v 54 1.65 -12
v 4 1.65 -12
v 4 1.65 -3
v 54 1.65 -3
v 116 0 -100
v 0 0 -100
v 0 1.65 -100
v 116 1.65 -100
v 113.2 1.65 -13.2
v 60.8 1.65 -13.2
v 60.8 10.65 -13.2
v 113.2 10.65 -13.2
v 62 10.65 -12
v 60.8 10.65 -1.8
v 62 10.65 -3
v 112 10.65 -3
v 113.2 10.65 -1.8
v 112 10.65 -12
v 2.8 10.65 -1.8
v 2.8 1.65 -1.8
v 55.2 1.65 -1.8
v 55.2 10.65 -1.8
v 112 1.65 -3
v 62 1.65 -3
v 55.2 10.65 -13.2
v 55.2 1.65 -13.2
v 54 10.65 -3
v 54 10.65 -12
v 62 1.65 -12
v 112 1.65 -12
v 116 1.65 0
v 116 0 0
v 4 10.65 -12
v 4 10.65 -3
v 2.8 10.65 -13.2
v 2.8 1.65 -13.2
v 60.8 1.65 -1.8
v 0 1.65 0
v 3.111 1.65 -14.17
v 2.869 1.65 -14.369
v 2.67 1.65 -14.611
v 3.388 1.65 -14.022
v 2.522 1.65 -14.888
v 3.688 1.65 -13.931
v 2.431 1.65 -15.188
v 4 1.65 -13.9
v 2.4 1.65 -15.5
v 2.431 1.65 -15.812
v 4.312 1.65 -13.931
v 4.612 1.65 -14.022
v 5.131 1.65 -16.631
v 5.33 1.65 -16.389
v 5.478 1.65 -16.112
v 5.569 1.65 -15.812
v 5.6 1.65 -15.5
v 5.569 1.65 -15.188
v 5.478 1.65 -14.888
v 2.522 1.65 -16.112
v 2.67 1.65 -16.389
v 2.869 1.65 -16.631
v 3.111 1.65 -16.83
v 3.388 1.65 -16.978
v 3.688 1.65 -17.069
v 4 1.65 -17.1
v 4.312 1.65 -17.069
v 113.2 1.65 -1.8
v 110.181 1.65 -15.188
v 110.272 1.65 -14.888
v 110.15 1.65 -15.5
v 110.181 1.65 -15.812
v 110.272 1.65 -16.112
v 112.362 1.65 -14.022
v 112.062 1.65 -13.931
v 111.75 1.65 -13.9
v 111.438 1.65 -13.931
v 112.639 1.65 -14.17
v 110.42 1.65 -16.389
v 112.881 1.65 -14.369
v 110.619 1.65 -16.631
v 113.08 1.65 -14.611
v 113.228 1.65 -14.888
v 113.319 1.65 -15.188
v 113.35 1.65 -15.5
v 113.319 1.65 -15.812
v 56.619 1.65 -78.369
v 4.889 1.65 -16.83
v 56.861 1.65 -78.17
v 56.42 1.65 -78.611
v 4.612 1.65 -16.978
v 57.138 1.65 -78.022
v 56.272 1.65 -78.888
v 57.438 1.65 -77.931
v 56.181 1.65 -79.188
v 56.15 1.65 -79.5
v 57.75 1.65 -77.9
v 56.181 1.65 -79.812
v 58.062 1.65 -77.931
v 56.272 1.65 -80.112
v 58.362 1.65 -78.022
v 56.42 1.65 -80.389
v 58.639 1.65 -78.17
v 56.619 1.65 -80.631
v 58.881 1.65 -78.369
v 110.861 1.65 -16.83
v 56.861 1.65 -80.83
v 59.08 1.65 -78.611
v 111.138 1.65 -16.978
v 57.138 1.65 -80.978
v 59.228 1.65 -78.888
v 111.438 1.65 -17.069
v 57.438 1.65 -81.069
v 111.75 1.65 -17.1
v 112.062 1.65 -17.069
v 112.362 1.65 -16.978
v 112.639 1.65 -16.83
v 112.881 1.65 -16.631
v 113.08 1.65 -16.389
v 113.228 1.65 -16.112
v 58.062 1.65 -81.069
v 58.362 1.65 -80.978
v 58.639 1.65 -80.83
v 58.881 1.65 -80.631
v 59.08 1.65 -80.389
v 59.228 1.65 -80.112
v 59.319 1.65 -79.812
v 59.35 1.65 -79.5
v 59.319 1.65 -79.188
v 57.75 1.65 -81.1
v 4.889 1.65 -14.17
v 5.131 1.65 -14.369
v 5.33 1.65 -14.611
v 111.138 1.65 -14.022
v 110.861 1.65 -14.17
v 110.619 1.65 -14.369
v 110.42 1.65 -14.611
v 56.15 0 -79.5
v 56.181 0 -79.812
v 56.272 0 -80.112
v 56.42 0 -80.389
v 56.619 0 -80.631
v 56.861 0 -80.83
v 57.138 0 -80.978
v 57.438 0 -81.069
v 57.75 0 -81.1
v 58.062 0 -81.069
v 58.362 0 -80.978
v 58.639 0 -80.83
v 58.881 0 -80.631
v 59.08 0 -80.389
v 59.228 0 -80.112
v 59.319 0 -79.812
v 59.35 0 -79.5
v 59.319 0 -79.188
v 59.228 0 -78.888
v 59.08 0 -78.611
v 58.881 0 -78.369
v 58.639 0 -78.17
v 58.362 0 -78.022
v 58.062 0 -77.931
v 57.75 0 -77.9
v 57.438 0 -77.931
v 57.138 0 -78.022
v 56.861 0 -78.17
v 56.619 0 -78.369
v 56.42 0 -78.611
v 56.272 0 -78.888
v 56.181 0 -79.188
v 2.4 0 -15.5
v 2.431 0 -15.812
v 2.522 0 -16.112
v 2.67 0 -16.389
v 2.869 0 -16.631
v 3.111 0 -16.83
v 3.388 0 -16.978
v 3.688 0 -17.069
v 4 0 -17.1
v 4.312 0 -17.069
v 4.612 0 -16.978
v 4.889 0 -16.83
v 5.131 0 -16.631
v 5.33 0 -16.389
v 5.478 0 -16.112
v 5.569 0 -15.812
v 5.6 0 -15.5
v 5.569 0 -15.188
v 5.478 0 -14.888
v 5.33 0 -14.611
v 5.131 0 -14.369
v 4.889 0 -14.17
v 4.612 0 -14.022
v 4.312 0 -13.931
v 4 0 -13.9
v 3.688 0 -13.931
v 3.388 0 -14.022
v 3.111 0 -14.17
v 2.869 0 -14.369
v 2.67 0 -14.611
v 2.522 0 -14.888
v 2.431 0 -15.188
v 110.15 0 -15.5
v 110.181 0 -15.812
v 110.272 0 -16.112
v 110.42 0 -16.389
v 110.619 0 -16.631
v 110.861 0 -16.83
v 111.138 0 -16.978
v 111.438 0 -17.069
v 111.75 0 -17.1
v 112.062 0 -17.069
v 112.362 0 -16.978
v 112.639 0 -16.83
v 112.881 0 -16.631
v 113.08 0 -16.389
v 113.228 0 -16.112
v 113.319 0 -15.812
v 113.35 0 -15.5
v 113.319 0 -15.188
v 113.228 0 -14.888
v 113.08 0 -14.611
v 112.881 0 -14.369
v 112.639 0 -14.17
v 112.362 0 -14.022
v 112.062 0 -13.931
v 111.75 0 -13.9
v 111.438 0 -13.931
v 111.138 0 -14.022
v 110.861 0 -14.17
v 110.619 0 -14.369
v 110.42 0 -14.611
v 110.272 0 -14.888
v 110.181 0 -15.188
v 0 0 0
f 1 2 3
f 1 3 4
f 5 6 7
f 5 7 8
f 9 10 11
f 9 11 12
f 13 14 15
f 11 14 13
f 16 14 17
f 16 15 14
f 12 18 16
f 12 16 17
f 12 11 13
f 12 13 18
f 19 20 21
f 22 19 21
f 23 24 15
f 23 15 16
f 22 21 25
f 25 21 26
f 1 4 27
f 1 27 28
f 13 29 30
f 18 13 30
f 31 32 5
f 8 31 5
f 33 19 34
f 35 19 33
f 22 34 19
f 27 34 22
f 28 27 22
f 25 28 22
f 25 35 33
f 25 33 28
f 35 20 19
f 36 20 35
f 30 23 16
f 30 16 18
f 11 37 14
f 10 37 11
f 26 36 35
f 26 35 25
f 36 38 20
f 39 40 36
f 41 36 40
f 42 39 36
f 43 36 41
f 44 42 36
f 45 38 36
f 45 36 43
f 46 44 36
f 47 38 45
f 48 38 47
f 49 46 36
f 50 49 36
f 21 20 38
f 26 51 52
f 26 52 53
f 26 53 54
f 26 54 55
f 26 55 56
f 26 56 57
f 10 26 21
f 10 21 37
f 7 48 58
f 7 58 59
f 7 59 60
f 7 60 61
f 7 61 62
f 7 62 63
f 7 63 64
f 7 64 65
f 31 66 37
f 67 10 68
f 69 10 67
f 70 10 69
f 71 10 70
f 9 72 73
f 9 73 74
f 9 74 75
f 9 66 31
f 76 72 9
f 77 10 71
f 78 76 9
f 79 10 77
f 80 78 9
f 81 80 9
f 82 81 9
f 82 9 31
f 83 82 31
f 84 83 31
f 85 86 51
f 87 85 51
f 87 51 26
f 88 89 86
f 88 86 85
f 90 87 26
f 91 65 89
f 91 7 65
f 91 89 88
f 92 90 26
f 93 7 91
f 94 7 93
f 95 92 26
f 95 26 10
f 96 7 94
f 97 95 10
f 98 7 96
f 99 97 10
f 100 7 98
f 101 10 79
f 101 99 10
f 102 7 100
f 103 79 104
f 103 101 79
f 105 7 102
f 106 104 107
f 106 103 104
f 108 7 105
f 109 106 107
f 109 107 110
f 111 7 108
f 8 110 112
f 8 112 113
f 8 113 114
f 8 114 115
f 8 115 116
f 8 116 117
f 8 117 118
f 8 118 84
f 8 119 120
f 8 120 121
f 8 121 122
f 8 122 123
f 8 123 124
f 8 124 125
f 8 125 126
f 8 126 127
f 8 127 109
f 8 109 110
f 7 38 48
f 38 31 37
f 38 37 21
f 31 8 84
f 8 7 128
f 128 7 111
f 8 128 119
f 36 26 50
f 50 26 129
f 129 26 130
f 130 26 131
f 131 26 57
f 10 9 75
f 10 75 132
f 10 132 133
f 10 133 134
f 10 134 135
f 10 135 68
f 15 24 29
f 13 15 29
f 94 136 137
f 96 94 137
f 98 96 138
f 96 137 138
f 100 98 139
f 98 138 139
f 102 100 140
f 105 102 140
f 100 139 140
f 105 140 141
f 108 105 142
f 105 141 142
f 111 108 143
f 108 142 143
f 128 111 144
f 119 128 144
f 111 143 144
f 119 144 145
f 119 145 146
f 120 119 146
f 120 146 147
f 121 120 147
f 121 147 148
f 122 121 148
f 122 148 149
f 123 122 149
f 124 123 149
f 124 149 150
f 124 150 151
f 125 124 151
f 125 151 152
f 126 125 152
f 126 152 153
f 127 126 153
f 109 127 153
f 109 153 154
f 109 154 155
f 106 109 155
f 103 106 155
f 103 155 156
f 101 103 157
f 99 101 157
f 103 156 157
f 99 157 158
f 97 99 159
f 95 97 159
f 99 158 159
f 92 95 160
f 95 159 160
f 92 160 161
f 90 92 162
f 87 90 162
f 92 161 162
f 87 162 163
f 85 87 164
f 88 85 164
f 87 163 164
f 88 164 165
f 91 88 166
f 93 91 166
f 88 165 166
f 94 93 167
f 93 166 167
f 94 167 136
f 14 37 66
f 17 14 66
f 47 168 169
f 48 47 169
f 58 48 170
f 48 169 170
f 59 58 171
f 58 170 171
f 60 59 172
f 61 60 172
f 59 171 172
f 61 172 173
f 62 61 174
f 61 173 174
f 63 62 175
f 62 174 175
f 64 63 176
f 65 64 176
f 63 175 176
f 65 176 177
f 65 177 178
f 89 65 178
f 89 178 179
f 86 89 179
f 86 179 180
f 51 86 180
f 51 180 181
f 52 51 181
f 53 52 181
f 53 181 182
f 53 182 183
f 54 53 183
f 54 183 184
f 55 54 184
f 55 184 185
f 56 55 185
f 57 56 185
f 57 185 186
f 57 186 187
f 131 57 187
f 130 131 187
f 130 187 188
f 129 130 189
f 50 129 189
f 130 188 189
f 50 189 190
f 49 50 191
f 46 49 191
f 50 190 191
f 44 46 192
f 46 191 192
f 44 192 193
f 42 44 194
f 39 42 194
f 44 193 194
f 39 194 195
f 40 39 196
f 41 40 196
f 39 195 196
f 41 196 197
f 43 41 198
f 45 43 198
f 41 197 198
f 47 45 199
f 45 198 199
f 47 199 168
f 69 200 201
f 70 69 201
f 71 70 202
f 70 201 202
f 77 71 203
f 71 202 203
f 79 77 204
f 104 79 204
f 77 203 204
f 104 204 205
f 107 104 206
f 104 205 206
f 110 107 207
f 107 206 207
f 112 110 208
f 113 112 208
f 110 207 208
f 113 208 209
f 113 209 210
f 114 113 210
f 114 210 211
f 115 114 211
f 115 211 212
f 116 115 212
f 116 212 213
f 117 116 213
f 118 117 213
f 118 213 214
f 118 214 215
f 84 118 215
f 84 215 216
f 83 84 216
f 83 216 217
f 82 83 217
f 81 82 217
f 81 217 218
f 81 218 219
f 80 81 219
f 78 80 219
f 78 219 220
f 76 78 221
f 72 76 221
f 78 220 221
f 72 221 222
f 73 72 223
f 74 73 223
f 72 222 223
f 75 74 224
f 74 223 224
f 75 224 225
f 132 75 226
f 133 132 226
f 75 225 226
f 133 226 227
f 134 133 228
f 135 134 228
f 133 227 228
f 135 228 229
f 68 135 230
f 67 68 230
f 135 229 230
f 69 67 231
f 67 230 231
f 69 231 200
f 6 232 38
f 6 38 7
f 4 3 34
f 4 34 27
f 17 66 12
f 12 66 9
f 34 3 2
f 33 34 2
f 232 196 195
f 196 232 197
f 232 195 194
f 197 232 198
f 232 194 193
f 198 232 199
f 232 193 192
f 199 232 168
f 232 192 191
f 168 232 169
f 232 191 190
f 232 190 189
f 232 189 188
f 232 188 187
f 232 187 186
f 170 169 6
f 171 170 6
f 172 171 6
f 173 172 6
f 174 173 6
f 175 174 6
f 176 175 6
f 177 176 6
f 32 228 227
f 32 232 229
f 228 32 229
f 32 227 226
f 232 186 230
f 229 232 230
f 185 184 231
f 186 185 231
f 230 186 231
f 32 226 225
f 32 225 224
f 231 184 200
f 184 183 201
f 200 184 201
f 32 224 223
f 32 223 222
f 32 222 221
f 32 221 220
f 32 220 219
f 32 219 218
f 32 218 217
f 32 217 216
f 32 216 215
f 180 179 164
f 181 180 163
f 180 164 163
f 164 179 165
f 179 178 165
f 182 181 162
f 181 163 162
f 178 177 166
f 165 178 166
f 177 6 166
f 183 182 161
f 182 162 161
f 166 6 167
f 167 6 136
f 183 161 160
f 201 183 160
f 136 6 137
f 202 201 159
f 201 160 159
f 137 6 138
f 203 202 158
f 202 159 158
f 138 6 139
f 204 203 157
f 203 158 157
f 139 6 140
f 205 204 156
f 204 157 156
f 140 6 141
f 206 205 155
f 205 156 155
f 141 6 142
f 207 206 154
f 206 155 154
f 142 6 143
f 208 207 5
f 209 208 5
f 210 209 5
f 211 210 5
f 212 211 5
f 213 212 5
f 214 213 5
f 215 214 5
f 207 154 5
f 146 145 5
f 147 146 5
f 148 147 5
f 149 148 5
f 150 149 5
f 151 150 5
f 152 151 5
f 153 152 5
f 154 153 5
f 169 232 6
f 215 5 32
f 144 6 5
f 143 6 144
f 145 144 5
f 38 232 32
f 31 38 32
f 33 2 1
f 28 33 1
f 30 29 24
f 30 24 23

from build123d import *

# Parameters (mm, degrees)
SKETCH1_W                = 116
SKETCH1_H                = 100
BOSS_EXTRUDE1_DEPTH      = 1.65
M3_CLEARANCE_HOLE1_D     = 3.2
M3_CLEARANCE_HOLE1_DEPTH = 20
M3_CLEARANCE_HOLE1_TIP   = 0.96137699
SKETCH6_W                = 52.4
SKETCH6_H                = 11.4
SKETCH6_W_2              = 50
SKETCH6_H_2              = 9
EXTRUDE_THIN1_DEPTH      = 9


with BuildPart() as part:
    # Sketch1 → Boss-Extrude1 (new body)
    with BuildSketch(Plane(origin=(0, 0, 0), x_dir=(1, 0, 0), z_dir=(0, 1, 0))):
        with Locations((58, 50)):
            Rectangle(SKETCH1_W, SKETCH1_H)
    extrude(amount=BOSS_EXTRUDE1_DEPTH)

    # M3 Clearance Hole1
    with Locations(Plane(origin=(0, 1.65, 0), x_dir=(1, 0, 0), z_dir=(0, 1, 0))):
        with Locations((4, 15.5), (111.75, 15.5), (57.75, 79.5)):
            Hole(M3_CLEARANCE_HOLE1_D / 2, depth=M3_CLEARANCE_HOLE1_DEPTH)
            with Locations((0, 0, -(M3_CLEARANCE_HOLE1_DEPTH + M3_CLEARANCE_HOLE1_TIP / 2))):  # 118° drill point
                Cone(0, M3_CLEARANCE_HOLE1_D / 2, M3_CLEARANCE_HOLE1_TIP, mode=Mode.SUBTRACT)

    # Sketch6 → Extrude-Thin1 (add)
    with BuildSketch(Plane(origin=(0, 1.65, 0), x_dir=(1, 0, 0), z_dir=(0, 1, 0))):
        with Locations((29, 7.5)):
            Rectangle(SKETCH6_W, SKETCH6_H)
        with Locations((29, 7.5)):
            Rectangle(SKETCH6_W_2, SKETCH6_H_2, mode=Mode.SUBTRACT)
        with Locations((87, 7.5)):
            Rectangle(SKETCH6_W, SKETCH6_H)
        with Locations((87, 7.5)):
            Rectangle(SKETCH6_W_2, SKETCH6_H_2, mode=Mode.SUBTRACT)
    extrude(amount=EXTRUDE_THIN1_DEPTH)


solid = part.part
